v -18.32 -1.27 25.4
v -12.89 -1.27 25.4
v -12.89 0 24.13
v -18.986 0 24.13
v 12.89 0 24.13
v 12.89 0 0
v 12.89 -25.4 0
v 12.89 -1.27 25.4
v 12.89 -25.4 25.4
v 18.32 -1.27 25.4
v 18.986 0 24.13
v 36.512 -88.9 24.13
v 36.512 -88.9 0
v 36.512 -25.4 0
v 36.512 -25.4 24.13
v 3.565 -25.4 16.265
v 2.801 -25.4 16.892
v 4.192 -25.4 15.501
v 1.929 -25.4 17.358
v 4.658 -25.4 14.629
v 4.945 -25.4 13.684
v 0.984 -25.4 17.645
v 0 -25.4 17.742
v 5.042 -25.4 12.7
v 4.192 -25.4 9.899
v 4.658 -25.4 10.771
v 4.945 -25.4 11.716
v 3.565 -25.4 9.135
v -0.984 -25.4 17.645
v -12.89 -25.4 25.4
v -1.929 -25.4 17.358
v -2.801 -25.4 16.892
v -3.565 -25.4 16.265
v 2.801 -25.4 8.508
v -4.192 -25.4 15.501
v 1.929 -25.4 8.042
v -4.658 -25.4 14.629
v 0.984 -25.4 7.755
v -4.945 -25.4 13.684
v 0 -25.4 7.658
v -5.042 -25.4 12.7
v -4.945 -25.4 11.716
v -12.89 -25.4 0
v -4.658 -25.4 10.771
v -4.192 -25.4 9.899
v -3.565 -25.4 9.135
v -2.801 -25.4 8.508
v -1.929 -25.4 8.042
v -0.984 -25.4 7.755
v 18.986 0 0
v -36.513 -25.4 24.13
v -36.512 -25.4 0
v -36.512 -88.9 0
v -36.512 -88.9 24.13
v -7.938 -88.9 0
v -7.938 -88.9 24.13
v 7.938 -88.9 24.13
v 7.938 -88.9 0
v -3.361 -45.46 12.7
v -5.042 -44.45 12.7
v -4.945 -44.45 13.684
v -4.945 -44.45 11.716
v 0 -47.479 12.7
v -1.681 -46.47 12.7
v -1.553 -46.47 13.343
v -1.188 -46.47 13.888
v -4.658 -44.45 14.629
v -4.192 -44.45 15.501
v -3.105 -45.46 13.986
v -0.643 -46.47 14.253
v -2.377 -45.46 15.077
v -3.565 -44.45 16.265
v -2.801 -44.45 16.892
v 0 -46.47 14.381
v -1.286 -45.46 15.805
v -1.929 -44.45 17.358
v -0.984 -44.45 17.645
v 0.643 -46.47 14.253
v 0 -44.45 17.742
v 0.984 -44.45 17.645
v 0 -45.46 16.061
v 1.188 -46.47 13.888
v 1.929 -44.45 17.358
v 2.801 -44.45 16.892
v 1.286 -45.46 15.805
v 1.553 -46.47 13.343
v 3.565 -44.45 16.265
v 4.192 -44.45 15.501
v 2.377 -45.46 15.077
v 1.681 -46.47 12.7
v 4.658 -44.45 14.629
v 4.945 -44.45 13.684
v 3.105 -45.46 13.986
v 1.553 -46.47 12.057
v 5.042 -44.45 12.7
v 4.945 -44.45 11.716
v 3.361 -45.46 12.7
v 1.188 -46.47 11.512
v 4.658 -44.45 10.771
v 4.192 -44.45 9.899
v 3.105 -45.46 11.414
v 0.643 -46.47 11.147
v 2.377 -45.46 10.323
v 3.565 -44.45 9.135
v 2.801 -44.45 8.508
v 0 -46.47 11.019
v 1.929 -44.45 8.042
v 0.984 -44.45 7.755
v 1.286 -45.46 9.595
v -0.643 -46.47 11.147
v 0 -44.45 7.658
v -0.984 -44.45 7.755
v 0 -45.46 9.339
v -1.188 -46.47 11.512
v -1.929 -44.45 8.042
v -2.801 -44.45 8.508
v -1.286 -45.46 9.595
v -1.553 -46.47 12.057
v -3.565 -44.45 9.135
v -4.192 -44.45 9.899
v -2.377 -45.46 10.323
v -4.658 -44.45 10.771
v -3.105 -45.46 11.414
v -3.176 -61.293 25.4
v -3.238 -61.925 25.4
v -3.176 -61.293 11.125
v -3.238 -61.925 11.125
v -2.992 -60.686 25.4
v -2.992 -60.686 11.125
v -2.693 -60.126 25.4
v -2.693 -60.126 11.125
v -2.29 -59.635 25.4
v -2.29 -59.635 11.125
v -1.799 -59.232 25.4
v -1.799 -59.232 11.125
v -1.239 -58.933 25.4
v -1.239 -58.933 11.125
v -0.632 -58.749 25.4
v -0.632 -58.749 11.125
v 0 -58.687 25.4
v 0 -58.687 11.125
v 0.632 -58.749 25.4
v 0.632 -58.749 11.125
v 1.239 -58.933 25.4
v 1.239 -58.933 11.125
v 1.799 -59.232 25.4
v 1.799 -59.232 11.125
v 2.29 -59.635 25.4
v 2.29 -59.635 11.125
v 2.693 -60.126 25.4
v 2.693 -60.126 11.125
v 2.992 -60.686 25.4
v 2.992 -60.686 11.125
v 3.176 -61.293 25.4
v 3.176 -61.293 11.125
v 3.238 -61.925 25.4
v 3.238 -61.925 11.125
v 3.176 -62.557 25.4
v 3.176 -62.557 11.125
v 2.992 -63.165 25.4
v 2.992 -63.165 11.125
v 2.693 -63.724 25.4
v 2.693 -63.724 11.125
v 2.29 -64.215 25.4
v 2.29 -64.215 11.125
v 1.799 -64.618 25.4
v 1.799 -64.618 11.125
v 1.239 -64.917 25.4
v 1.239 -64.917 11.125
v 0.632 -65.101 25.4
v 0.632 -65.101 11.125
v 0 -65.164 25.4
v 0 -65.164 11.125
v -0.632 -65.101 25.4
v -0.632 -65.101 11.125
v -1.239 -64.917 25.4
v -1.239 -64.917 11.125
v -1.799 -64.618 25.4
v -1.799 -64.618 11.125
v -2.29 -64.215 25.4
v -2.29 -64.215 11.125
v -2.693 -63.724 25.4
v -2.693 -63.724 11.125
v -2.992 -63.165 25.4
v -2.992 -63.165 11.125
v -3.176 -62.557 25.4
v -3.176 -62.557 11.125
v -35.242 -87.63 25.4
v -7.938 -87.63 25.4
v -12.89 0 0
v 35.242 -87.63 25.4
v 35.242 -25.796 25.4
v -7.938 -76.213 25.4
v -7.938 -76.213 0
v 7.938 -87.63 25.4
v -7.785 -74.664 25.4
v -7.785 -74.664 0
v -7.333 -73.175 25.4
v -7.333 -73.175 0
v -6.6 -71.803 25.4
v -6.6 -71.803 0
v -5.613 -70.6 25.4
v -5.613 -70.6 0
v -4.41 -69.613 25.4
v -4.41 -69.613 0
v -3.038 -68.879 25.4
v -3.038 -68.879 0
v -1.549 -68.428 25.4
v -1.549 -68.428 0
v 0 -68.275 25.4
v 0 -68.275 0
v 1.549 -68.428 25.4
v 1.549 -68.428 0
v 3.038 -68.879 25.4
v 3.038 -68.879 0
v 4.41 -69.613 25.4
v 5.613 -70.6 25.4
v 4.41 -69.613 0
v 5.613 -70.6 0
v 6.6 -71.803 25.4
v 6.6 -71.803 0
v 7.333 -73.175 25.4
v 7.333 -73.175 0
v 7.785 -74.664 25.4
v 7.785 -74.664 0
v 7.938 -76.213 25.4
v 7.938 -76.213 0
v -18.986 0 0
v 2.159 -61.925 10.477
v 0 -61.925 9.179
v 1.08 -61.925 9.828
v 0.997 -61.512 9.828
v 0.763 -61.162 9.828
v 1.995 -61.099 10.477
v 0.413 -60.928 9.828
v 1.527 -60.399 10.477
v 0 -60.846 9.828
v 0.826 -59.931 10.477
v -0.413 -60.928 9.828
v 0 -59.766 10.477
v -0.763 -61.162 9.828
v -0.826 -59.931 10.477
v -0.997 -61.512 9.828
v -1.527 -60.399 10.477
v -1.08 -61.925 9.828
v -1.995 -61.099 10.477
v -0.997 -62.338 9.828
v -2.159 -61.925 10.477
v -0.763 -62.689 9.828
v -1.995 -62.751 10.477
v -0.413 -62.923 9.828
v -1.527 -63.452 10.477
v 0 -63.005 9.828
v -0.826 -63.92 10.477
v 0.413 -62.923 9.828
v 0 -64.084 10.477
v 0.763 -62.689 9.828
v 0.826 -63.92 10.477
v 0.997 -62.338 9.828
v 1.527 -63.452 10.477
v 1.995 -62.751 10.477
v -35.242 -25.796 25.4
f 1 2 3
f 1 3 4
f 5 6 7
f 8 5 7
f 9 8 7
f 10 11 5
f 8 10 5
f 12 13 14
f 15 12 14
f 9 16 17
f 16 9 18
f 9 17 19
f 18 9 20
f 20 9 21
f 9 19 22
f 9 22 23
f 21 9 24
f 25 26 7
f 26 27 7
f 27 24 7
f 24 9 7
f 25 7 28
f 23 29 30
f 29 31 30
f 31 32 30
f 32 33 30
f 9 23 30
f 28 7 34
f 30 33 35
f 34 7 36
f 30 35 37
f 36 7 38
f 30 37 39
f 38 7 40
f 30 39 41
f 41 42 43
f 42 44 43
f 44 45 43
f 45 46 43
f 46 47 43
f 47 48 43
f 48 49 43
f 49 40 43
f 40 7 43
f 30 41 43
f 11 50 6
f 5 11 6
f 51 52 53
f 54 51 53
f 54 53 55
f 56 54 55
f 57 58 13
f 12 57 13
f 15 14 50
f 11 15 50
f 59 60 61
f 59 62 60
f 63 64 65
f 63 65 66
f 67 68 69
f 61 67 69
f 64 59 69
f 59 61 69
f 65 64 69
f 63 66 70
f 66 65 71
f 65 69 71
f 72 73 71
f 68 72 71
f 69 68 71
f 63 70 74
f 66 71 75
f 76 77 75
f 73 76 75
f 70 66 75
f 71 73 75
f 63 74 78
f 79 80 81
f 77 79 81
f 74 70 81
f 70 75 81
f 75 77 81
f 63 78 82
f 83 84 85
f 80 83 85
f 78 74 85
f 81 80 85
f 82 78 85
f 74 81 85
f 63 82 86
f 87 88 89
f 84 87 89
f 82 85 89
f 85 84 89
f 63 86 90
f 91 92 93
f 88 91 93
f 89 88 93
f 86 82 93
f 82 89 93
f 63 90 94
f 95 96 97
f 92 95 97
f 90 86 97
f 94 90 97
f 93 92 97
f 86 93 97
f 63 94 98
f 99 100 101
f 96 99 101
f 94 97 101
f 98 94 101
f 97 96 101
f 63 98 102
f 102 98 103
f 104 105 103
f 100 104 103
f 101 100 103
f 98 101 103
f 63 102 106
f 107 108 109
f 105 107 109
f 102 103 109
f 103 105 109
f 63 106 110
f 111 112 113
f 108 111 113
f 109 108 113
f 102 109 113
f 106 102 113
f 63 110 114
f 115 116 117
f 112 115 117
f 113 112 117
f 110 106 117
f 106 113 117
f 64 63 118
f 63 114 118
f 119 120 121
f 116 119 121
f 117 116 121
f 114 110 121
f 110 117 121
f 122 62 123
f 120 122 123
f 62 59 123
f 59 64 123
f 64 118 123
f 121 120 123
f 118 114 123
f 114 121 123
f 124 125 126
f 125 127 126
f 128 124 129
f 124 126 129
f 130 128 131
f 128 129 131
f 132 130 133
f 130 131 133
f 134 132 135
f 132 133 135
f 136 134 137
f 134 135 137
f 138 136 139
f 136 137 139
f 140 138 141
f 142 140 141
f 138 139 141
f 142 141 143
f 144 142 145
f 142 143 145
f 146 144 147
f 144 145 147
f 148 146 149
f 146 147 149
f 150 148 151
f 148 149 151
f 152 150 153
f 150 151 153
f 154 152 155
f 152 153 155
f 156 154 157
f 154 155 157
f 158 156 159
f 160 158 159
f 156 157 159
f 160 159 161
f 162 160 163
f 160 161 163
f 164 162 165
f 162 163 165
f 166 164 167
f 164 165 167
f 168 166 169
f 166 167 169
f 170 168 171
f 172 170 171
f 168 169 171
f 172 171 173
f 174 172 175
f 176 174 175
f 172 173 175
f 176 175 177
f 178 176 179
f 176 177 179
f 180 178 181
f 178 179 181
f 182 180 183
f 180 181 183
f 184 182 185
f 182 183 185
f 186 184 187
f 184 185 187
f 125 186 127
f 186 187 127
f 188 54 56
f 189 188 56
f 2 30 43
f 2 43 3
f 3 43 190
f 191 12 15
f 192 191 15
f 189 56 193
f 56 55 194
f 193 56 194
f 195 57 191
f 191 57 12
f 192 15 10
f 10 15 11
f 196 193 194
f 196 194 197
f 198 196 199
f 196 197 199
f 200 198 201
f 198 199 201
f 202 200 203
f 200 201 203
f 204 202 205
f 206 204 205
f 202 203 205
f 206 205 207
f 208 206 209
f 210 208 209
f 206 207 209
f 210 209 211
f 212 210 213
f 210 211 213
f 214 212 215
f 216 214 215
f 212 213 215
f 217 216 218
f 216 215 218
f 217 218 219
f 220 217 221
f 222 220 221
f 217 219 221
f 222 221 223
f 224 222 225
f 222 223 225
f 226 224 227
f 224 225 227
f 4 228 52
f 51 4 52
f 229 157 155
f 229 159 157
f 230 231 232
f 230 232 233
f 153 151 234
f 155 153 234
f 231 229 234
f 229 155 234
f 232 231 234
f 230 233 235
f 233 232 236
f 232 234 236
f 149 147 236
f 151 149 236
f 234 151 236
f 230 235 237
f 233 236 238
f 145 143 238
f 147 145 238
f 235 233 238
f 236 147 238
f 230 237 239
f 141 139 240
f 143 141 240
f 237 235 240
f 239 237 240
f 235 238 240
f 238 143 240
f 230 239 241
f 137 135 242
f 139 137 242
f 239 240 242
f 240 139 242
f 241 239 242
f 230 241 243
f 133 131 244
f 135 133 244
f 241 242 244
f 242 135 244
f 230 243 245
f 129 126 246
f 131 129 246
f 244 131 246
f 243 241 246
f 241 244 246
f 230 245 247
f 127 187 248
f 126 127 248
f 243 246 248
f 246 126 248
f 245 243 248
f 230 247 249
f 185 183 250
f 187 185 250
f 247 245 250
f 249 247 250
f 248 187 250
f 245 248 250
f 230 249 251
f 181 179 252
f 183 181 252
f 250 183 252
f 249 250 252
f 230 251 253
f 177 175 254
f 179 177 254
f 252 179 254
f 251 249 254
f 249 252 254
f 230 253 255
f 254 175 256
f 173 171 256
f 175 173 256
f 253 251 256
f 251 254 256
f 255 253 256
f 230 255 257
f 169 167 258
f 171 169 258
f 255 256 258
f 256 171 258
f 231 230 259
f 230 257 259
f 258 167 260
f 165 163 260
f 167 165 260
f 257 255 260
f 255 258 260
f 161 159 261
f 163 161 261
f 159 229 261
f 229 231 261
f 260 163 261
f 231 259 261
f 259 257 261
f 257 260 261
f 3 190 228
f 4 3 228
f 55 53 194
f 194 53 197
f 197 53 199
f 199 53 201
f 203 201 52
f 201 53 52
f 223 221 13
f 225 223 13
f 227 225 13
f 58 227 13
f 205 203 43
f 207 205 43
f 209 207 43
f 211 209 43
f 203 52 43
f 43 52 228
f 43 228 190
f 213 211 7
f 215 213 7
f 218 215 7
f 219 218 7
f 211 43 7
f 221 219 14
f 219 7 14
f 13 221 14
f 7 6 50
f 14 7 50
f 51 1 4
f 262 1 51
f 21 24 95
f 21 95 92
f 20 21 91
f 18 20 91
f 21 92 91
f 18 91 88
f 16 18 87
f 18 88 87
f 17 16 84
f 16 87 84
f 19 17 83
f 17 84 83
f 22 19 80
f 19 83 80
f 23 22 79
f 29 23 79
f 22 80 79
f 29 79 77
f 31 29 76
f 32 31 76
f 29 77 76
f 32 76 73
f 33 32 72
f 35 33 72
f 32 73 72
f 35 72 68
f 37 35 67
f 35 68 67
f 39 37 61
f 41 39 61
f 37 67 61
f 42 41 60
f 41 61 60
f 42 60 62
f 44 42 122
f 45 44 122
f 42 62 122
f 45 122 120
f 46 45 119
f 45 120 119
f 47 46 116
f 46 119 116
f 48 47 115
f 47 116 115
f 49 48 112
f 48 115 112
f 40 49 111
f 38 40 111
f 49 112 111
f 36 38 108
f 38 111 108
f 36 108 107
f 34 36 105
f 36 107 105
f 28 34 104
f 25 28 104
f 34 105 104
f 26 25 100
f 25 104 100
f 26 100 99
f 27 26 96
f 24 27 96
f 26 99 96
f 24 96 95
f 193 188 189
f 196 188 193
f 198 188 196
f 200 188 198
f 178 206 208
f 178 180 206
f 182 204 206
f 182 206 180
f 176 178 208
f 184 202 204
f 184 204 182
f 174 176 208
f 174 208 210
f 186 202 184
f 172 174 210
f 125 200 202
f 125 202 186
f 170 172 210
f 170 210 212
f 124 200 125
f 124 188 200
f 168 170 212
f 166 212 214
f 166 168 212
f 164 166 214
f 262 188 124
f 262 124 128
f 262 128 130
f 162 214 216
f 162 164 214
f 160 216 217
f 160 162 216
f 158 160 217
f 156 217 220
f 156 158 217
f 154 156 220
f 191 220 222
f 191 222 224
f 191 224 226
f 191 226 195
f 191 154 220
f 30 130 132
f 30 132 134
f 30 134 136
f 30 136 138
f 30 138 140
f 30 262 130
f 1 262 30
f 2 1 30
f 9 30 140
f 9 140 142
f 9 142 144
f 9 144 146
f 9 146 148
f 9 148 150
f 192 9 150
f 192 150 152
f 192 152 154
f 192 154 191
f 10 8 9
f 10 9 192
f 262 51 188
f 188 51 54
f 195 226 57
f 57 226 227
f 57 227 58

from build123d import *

# Parameters (mm, degrees)
F1_DEPTH = 25.4
F3_D     = 10.0838
F3_DEPTH = 19.05
F3_TIP   = 3.0294791551
F5_D     = 6.477
F5_DEPTH = 14.2748
F5_TIP   = 1.9458871147
F6_SIZE  = 1.27


with BuildPart() as f1:
    # F0 (on Top) → F1 (new body)
    with BuildSketch(Plane.XY):
        with BuildLine():
            Line((-12.8905, 0), (-18.9865, 0))
            Line((-18.9865, 0), (-36.5125, -25.4))
            Line((-36.5125, -25.4), (-36.5125, -88.9))
            Line((-36.5125, -88.9), (-7.9375, -88.9))
            Line((-7.9375, -88.9), (-7.9375, -76.2127))
            ThreePointArc((-7.9375, -76.2127), (0, -68.2752), (7.9375, -76.2127))
            Line((7.9375, -76.2127), (7.9375, -88.9))
            Line((7.9375, -88.9), (36.5125, -88.9))
            Line((36.5125, -88.9), (36.5125, -25.4))
            Line((36.5125, -25.4), (18.9865, 0))
            Line((18.9865, 0), (12.8905, 0))
            Line((12.8905, 0), (12.8905, -25.4))
            Line((12.8905, -25.4), (-12.8905, -25.4))
            Line((-12.8905, -25.4), (-12.8905, 0))
        make_face()
    extrude(amount=F1_DEPTH)

    # F3
    with Locations(Plane(origin=(0, -25.4, 0), x_dir=(-1, 0, 0), z_dir=(0, 1, 0))):
        with Locations((0, 12.7)):
            Hole(F3_D / 2, depth=F3_DEPTH)
            with Locations((0, 0, -(F3_DEPTH + F3_TIP / 2))):  # 118° drill point
                Cone(0, F3_D / 2, F3_TIP, mode=Mode.SUBTRACT)

    # F5
    with Locations(Plane.XY.offset(25.4)):
        with Locations((0, -61.9252)):
            Hole(F5_D / 2, depth=F5_DEPTH)
            with Locations((0, 0, -(F5_DEPTH + F5_TIP / 2))):  # 118° drill point
                Cone(0, F5_D / 2, F5_TIP, mode=Mode.SUBTRACT)

    # F6
    f6_edges = [f1.edges().sort_by_distance(p)[0] for p in [
        (-22.225, -88.9, 25.4),
        (-15.9385, 0, 25.4),
        (-27.7495, -12.7, 25.4),
        (-36.5125, -57.15, 25.4),
        (15.9385, 0, 25.4),
        (27.7495, -12.7, 25.4),
        (36.5125, -57.15, 25.4),
        (22.225, -88.9, 25.4),
    ]]
    chamfer(f6_edges, length=F6_SIZE)


solid = f1.part
